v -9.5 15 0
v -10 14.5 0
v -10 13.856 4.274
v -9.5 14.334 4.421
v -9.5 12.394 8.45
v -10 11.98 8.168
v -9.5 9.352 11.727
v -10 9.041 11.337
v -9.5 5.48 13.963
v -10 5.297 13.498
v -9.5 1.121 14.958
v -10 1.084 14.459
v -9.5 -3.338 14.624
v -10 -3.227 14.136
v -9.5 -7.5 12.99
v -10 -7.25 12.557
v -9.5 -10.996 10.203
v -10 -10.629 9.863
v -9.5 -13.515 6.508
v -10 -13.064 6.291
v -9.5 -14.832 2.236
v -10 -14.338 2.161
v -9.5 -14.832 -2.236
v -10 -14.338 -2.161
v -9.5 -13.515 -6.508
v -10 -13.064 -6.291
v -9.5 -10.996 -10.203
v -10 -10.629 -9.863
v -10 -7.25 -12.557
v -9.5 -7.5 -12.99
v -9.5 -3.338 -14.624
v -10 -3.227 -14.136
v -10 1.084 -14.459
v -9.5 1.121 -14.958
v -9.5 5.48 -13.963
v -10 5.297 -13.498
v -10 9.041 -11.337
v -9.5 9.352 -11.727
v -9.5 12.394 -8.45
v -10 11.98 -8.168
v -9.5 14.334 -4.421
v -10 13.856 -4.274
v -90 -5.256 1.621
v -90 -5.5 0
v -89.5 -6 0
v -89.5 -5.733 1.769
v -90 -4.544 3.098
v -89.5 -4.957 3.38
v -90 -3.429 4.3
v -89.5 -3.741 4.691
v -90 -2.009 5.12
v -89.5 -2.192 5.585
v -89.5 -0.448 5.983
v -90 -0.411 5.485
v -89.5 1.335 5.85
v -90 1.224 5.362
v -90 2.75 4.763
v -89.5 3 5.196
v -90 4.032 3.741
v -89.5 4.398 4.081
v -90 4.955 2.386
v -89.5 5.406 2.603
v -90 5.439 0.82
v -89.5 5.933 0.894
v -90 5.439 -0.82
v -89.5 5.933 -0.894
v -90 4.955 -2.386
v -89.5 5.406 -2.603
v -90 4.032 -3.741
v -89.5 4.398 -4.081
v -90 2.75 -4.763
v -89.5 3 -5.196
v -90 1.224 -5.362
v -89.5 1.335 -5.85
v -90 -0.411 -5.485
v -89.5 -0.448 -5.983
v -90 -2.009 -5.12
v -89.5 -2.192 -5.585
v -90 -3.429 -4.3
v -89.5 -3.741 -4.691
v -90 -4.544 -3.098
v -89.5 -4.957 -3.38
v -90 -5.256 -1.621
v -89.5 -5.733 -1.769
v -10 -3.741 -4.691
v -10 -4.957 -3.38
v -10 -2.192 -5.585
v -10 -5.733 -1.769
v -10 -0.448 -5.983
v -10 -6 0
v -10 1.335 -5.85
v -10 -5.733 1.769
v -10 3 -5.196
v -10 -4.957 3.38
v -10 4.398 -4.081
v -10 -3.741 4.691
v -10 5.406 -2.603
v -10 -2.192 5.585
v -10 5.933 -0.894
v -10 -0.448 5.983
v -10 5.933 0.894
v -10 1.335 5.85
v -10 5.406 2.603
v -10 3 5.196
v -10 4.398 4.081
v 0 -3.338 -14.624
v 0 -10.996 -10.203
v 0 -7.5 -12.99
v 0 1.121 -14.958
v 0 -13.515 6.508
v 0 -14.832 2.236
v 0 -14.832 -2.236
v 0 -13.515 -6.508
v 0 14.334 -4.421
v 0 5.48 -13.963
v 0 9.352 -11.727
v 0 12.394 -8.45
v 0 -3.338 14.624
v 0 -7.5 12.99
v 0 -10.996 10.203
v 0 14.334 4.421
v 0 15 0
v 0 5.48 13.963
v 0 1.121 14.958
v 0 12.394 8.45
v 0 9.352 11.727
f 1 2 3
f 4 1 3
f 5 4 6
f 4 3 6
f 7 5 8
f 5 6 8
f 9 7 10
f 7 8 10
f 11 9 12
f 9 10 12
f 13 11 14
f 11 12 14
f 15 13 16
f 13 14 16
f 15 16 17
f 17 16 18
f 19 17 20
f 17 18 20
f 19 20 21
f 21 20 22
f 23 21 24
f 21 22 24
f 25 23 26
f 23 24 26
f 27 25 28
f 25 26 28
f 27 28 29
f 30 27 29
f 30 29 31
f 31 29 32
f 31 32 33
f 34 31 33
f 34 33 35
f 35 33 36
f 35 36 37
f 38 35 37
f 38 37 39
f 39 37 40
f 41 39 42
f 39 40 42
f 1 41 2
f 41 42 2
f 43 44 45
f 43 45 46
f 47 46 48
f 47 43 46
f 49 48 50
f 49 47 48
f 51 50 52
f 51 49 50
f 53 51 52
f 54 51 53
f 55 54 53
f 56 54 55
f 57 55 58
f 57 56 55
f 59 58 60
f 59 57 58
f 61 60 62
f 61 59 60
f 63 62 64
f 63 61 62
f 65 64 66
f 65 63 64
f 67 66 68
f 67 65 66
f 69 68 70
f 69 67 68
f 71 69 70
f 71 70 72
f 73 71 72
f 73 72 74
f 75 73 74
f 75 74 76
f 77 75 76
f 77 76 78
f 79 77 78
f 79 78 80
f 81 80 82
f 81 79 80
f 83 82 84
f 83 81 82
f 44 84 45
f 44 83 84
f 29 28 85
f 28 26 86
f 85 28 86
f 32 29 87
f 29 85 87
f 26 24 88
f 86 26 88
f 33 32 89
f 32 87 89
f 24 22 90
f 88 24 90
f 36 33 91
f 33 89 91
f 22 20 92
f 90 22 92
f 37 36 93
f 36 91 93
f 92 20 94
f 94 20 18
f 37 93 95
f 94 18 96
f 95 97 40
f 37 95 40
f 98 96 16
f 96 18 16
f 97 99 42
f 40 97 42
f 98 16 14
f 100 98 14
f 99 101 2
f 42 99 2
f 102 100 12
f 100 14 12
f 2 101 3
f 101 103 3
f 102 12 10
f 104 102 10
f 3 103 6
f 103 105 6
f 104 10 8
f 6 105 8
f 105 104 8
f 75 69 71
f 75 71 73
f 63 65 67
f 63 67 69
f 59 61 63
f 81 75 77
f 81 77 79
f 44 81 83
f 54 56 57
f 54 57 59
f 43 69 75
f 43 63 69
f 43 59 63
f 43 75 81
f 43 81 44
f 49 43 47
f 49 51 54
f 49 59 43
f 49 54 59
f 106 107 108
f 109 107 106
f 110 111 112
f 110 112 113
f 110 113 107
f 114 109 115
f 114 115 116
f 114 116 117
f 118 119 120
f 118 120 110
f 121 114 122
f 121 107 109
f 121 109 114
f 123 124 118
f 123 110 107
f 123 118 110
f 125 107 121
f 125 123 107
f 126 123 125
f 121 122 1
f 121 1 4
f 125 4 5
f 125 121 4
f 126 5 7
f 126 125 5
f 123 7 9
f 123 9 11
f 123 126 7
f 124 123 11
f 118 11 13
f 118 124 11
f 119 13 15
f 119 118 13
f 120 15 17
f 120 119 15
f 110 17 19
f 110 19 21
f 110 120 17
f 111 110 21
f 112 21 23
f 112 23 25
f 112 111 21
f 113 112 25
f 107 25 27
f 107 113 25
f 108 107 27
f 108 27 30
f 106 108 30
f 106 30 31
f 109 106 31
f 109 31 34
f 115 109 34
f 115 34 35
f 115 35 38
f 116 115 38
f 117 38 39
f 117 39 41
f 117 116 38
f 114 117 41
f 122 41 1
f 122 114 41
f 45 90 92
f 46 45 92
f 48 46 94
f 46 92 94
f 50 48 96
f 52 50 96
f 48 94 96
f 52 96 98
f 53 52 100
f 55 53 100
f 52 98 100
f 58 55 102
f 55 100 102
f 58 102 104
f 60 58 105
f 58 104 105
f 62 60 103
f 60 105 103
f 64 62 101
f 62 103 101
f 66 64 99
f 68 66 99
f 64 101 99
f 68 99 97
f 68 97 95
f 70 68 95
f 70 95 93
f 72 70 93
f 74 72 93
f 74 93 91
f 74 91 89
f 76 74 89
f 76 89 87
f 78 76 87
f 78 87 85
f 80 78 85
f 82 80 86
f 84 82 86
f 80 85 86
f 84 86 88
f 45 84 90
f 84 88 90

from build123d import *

# Parameters (mm, degrees)
F0_R     = 15
F1_DEPTH = 10
F2_R     = 6
F3_DEPTH = 80
F4_SIZE  = 0.5


with BuildPart() as f1:
    # F0 (on Right) → F1 (new body)
    with BuildSketch(Plane.YZ):
        Circle(F0_R)
    extrude(amount=-F1_DEPTH)

    # F2 (on face) → F3 (join)
    with BuildSketch(Plane(origin=(-10, 0, 0), x_dir=(0, -1, 0), z_dir=(-1, 0, 0))):
        Circle(F2_R)
    extrude(amount=F3_DEPTH)

    # F4
    f4_edges = [f1.edges().sort_by_distance(p)[0] for p in [
        (-90, 6, 0),
        (-10, -15, 0),
    ]]
    chamfer(f4_edges, length=F4_SIZE)


solid = f1.part
